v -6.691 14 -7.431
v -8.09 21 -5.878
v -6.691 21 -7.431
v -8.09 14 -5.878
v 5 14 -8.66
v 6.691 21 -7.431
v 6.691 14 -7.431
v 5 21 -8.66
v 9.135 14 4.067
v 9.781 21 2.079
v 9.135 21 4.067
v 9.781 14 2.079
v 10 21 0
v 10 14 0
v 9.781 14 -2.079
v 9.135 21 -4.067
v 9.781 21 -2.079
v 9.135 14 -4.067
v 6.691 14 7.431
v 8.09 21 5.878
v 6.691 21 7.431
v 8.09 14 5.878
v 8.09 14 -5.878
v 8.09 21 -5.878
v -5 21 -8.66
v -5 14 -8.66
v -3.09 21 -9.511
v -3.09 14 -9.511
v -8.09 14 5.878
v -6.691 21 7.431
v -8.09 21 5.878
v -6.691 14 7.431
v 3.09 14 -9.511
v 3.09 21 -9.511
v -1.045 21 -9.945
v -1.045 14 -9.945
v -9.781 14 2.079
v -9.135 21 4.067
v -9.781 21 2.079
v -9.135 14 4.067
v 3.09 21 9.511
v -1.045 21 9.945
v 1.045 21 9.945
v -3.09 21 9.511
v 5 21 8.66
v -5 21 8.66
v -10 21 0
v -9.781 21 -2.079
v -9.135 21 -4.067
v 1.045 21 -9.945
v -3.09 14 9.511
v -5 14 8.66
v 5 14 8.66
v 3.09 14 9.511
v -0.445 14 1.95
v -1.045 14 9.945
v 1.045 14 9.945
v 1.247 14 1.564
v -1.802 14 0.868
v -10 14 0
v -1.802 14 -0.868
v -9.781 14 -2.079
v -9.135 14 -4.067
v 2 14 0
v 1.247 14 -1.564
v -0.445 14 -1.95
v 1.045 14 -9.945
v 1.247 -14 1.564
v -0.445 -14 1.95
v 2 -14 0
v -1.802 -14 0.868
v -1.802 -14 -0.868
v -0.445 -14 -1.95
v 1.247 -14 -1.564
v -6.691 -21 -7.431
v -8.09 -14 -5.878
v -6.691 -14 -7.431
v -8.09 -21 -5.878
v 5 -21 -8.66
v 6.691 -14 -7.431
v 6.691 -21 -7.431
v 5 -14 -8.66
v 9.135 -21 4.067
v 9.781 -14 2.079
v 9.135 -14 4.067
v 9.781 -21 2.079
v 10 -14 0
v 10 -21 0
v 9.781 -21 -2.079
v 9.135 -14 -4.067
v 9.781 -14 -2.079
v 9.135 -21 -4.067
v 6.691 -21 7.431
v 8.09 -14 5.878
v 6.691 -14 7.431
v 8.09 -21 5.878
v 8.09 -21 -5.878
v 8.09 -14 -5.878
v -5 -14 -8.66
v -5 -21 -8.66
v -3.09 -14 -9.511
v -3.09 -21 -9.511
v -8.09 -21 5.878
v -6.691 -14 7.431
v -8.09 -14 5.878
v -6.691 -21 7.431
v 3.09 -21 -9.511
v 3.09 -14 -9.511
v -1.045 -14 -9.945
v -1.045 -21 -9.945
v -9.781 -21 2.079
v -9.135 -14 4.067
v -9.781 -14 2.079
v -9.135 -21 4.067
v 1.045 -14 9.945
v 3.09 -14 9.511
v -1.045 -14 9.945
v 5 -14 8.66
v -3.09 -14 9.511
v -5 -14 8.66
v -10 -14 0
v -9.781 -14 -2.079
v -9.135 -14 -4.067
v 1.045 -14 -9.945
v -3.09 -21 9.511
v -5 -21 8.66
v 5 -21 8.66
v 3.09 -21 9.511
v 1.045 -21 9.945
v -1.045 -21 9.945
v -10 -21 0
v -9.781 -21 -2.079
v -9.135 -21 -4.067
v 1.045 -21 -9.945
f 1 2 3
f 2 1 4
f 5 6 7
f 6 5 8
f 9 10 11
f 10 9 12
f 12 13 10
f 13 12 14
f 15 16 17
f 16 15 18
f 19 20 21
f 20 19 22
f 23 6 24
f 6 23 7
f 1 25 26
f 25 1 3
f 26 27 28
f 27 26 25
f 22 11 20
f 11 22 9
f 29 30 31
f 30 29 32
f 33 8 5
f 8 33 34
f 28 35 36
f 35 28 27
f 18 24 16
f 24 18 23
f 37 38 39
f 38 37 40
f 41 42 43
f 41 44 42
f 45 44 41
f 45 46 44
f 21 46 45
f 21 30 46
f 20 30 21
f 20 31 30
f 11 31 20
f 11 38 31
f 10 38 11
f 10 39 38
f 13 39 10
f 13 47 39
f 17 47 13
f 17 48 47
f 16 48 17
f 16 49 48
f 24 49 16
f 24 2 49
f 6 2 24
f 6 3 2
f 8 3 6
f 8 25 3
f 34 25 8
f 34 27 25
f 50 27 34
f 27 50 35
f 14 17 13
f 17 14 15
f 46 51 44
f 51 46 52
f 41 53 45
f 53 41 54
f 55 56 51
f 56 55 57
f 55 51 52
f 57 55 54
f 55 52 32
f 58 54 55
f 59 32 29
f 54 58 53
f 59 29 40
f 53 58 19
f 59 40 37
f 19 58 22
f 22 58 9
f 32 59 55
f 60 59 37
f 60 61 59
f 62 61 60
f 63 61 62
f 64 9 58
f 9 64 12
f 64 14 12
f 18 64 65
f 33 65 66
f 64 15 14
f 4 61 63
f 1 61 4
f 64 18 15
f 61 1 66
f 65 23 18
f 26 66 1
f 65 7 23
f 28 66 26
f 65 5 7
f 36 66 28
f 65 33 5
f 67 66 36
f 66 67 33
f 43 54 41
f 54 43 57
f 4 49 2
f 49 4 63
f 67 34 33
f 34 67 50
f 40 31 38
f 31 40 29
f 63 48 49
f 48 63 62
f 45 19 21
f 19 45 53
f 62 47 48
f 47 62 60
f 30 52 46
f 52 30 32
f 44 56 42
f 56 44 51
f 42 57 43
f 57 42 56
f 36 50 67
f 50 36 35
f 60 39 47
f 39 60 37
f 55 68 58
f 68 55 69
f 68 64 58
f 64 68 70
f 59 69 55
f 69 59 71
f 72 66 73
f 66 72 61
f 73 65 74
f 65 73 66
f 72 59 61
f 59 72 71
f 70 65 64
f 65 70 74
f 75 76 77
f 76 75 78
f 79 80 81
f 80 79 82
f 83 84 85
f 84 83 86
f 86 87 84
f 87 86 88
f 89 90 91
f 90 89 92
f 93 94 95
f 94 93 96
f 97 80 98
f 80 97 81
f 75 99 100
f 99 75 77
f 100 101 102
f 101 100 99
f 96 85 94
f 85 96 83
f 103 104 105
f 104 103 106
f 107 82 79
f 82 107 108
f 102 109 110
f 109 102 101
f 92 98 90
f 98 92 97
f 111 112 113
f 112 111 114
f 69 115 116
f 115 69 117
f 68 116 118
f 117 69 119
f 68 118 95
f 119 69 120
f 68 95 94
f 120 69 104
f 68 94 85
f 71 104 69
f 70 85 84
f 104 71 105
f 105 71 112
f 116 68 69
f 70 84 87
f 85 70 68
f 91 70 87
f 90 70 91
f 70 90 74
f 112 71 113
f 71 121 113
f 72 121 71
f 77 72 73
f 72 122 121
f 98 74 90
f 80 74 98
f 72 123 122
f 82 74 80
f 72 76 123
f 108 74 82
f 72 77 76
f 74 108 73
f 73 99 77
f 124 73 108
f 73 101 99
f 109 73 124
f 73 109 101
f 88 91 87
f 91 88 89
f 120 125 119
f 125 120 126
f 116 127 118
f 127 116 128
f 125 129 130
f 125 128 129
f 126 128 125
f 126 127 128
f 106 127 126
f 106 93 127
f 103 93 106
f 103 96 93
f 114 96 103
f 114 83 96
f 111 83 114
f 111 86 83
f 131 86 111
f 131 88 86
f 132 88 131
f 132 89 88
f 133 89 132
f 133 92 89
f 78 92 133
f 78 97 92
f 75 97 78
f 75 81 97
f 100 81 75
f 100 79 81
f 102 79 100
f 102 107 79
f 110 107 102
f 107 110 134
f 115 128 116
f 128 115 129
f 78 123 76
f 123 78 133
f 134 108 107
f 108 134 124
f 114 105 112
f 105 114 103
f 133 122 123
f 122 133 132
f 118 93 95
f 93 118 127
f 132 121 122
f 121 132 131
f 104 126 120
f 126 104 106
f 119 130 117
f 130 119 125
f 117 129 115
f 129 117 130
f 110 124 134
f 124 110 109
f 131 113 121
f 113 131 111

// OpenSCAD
// file: partes_veiculo.scad
//$fa=1;
//$fs=0.4;

module carroceria(base_height=5, top_height=10, base_width=60, top_width=30, is_move_top=true) {
      
       move_top = is_move_top ? 5:0;
       
       cube([base_width,20,base_height], center=true);
       translate([move_top,0,base_height/2 + top_height/2-0.001])
       cube([top_width,20,top_height], center=true);   
}

module carroceriaesferica(base_height, top_height){
     resize([80,25,10])
     sphere(20);
     translate([0,0,5])
     resize([40,15,20])
     sphere(20);
}

module rodasimples(posicao_roda=20,distancia_roda,largura_roda=7, raio_roda=10) {
    translate([posicao_roda,distancia_roda,0])
    rotate([90,0,0])
    cylinder(h=largura_roda, r=raio_roda, center=true);    
}

module rodasimples1(largura_roda=7, raio_roda=10) {
    rotate([90,0,0])
    cylinder(h=largura_roda, r=raio_roda, center=true);    
}

module rodaesferica(posicao_roda, distancia_roda, largura_roda, raio_roda) {
    translate([posicao_roda,distancia_roda,0])
    difference() {
    sphere(raio_roda);
        translate([0,raio_roda,0])
    sphere(raio_roda);
        translate([0,-raio_roda,0])
    sphere(raio_roda);
    rotate([90,0,0])
    translate([0,5,0])
    cylinder(40,2,2, center=true);
    rotate([90,0,0])
    translate([0,-5,0])
    cylinder(40,2,2, center=true);
    rotate([90,0,0])
    translate([-5,0,0])
    cylinder(40,2,2, center=true);
    rotate([90,0,0])
    translate([5,0,0])
    cylinder(40,2,2, center=true);
    }
}

module eixo(posicao_eixo=20, distancia_eixo=35, raio_eixo=2) {
    rotate([90,0,0])
    translate([posicao_eixo,0,0])
    cylinder(h=distancia_eixo,r=raio_eixo, center=true);    
}
module eixosimples(distancia_eixo=35, raio_eixo=2) {
    rotate([90,0,0])
    cylinder(h=distancia_eixo,r=raio_eixo, center=true);    
}

module eixo_complexo(distancia=35, raio=2) {
    
    translate([0,distancia/2,0])
    children(0);
    eixosimples(distancia_eixo=distancia, raio_eixo=raio);
    translate([0,-distancia/2,0])
    children(0);
}

module rodas_e_eixo(distancia_roda, largura_roda, raio_roda, distancia_eixo, posicao_eixo=20, posicao_roda=20) {
    rodasimples(-posicao_roda, -distancia_roda, largura_roda, raio_roda);
    rodasimples(-posicao_roda, distancia_roda, largura_roda, raio_roda);
    rodasimples(posicao_roda, -distancia_roda, largura_roda, raio_roda);
    rodasimples(posicao_roda, distancia_roda, largura_roda, raio_roda);
    eixo(-posicao_eixo, distancia_eixo);
    eixo(posicao_eixo, distancia_eixo);
}
module carro(raio_roda=10, distancia_eixo=35, largura_roda=7, base_height=5, top_height=10, posicao_eixo=20,base_width=60, top_width=30, is_move_top=true) {
    distancia_roda=distancia_eixo/2;
    carroceria(base_height, top_height,base_width,top_width, is_move_top);
    rodas_e_eixo(distancia_roda, largura_roda, raio_roda, distancia_eixo, posicao_eixo);
}

//carro_basico();
// main file
use <partes_veiculo.scad>

//translate([0,-25,0])
//carro(is_move_top=true);
//translate([0,25,0])
//carro(is_move_top=false, top_width=60, top_height=20);
eixo_complexo() {
    rodasimples1();
}
